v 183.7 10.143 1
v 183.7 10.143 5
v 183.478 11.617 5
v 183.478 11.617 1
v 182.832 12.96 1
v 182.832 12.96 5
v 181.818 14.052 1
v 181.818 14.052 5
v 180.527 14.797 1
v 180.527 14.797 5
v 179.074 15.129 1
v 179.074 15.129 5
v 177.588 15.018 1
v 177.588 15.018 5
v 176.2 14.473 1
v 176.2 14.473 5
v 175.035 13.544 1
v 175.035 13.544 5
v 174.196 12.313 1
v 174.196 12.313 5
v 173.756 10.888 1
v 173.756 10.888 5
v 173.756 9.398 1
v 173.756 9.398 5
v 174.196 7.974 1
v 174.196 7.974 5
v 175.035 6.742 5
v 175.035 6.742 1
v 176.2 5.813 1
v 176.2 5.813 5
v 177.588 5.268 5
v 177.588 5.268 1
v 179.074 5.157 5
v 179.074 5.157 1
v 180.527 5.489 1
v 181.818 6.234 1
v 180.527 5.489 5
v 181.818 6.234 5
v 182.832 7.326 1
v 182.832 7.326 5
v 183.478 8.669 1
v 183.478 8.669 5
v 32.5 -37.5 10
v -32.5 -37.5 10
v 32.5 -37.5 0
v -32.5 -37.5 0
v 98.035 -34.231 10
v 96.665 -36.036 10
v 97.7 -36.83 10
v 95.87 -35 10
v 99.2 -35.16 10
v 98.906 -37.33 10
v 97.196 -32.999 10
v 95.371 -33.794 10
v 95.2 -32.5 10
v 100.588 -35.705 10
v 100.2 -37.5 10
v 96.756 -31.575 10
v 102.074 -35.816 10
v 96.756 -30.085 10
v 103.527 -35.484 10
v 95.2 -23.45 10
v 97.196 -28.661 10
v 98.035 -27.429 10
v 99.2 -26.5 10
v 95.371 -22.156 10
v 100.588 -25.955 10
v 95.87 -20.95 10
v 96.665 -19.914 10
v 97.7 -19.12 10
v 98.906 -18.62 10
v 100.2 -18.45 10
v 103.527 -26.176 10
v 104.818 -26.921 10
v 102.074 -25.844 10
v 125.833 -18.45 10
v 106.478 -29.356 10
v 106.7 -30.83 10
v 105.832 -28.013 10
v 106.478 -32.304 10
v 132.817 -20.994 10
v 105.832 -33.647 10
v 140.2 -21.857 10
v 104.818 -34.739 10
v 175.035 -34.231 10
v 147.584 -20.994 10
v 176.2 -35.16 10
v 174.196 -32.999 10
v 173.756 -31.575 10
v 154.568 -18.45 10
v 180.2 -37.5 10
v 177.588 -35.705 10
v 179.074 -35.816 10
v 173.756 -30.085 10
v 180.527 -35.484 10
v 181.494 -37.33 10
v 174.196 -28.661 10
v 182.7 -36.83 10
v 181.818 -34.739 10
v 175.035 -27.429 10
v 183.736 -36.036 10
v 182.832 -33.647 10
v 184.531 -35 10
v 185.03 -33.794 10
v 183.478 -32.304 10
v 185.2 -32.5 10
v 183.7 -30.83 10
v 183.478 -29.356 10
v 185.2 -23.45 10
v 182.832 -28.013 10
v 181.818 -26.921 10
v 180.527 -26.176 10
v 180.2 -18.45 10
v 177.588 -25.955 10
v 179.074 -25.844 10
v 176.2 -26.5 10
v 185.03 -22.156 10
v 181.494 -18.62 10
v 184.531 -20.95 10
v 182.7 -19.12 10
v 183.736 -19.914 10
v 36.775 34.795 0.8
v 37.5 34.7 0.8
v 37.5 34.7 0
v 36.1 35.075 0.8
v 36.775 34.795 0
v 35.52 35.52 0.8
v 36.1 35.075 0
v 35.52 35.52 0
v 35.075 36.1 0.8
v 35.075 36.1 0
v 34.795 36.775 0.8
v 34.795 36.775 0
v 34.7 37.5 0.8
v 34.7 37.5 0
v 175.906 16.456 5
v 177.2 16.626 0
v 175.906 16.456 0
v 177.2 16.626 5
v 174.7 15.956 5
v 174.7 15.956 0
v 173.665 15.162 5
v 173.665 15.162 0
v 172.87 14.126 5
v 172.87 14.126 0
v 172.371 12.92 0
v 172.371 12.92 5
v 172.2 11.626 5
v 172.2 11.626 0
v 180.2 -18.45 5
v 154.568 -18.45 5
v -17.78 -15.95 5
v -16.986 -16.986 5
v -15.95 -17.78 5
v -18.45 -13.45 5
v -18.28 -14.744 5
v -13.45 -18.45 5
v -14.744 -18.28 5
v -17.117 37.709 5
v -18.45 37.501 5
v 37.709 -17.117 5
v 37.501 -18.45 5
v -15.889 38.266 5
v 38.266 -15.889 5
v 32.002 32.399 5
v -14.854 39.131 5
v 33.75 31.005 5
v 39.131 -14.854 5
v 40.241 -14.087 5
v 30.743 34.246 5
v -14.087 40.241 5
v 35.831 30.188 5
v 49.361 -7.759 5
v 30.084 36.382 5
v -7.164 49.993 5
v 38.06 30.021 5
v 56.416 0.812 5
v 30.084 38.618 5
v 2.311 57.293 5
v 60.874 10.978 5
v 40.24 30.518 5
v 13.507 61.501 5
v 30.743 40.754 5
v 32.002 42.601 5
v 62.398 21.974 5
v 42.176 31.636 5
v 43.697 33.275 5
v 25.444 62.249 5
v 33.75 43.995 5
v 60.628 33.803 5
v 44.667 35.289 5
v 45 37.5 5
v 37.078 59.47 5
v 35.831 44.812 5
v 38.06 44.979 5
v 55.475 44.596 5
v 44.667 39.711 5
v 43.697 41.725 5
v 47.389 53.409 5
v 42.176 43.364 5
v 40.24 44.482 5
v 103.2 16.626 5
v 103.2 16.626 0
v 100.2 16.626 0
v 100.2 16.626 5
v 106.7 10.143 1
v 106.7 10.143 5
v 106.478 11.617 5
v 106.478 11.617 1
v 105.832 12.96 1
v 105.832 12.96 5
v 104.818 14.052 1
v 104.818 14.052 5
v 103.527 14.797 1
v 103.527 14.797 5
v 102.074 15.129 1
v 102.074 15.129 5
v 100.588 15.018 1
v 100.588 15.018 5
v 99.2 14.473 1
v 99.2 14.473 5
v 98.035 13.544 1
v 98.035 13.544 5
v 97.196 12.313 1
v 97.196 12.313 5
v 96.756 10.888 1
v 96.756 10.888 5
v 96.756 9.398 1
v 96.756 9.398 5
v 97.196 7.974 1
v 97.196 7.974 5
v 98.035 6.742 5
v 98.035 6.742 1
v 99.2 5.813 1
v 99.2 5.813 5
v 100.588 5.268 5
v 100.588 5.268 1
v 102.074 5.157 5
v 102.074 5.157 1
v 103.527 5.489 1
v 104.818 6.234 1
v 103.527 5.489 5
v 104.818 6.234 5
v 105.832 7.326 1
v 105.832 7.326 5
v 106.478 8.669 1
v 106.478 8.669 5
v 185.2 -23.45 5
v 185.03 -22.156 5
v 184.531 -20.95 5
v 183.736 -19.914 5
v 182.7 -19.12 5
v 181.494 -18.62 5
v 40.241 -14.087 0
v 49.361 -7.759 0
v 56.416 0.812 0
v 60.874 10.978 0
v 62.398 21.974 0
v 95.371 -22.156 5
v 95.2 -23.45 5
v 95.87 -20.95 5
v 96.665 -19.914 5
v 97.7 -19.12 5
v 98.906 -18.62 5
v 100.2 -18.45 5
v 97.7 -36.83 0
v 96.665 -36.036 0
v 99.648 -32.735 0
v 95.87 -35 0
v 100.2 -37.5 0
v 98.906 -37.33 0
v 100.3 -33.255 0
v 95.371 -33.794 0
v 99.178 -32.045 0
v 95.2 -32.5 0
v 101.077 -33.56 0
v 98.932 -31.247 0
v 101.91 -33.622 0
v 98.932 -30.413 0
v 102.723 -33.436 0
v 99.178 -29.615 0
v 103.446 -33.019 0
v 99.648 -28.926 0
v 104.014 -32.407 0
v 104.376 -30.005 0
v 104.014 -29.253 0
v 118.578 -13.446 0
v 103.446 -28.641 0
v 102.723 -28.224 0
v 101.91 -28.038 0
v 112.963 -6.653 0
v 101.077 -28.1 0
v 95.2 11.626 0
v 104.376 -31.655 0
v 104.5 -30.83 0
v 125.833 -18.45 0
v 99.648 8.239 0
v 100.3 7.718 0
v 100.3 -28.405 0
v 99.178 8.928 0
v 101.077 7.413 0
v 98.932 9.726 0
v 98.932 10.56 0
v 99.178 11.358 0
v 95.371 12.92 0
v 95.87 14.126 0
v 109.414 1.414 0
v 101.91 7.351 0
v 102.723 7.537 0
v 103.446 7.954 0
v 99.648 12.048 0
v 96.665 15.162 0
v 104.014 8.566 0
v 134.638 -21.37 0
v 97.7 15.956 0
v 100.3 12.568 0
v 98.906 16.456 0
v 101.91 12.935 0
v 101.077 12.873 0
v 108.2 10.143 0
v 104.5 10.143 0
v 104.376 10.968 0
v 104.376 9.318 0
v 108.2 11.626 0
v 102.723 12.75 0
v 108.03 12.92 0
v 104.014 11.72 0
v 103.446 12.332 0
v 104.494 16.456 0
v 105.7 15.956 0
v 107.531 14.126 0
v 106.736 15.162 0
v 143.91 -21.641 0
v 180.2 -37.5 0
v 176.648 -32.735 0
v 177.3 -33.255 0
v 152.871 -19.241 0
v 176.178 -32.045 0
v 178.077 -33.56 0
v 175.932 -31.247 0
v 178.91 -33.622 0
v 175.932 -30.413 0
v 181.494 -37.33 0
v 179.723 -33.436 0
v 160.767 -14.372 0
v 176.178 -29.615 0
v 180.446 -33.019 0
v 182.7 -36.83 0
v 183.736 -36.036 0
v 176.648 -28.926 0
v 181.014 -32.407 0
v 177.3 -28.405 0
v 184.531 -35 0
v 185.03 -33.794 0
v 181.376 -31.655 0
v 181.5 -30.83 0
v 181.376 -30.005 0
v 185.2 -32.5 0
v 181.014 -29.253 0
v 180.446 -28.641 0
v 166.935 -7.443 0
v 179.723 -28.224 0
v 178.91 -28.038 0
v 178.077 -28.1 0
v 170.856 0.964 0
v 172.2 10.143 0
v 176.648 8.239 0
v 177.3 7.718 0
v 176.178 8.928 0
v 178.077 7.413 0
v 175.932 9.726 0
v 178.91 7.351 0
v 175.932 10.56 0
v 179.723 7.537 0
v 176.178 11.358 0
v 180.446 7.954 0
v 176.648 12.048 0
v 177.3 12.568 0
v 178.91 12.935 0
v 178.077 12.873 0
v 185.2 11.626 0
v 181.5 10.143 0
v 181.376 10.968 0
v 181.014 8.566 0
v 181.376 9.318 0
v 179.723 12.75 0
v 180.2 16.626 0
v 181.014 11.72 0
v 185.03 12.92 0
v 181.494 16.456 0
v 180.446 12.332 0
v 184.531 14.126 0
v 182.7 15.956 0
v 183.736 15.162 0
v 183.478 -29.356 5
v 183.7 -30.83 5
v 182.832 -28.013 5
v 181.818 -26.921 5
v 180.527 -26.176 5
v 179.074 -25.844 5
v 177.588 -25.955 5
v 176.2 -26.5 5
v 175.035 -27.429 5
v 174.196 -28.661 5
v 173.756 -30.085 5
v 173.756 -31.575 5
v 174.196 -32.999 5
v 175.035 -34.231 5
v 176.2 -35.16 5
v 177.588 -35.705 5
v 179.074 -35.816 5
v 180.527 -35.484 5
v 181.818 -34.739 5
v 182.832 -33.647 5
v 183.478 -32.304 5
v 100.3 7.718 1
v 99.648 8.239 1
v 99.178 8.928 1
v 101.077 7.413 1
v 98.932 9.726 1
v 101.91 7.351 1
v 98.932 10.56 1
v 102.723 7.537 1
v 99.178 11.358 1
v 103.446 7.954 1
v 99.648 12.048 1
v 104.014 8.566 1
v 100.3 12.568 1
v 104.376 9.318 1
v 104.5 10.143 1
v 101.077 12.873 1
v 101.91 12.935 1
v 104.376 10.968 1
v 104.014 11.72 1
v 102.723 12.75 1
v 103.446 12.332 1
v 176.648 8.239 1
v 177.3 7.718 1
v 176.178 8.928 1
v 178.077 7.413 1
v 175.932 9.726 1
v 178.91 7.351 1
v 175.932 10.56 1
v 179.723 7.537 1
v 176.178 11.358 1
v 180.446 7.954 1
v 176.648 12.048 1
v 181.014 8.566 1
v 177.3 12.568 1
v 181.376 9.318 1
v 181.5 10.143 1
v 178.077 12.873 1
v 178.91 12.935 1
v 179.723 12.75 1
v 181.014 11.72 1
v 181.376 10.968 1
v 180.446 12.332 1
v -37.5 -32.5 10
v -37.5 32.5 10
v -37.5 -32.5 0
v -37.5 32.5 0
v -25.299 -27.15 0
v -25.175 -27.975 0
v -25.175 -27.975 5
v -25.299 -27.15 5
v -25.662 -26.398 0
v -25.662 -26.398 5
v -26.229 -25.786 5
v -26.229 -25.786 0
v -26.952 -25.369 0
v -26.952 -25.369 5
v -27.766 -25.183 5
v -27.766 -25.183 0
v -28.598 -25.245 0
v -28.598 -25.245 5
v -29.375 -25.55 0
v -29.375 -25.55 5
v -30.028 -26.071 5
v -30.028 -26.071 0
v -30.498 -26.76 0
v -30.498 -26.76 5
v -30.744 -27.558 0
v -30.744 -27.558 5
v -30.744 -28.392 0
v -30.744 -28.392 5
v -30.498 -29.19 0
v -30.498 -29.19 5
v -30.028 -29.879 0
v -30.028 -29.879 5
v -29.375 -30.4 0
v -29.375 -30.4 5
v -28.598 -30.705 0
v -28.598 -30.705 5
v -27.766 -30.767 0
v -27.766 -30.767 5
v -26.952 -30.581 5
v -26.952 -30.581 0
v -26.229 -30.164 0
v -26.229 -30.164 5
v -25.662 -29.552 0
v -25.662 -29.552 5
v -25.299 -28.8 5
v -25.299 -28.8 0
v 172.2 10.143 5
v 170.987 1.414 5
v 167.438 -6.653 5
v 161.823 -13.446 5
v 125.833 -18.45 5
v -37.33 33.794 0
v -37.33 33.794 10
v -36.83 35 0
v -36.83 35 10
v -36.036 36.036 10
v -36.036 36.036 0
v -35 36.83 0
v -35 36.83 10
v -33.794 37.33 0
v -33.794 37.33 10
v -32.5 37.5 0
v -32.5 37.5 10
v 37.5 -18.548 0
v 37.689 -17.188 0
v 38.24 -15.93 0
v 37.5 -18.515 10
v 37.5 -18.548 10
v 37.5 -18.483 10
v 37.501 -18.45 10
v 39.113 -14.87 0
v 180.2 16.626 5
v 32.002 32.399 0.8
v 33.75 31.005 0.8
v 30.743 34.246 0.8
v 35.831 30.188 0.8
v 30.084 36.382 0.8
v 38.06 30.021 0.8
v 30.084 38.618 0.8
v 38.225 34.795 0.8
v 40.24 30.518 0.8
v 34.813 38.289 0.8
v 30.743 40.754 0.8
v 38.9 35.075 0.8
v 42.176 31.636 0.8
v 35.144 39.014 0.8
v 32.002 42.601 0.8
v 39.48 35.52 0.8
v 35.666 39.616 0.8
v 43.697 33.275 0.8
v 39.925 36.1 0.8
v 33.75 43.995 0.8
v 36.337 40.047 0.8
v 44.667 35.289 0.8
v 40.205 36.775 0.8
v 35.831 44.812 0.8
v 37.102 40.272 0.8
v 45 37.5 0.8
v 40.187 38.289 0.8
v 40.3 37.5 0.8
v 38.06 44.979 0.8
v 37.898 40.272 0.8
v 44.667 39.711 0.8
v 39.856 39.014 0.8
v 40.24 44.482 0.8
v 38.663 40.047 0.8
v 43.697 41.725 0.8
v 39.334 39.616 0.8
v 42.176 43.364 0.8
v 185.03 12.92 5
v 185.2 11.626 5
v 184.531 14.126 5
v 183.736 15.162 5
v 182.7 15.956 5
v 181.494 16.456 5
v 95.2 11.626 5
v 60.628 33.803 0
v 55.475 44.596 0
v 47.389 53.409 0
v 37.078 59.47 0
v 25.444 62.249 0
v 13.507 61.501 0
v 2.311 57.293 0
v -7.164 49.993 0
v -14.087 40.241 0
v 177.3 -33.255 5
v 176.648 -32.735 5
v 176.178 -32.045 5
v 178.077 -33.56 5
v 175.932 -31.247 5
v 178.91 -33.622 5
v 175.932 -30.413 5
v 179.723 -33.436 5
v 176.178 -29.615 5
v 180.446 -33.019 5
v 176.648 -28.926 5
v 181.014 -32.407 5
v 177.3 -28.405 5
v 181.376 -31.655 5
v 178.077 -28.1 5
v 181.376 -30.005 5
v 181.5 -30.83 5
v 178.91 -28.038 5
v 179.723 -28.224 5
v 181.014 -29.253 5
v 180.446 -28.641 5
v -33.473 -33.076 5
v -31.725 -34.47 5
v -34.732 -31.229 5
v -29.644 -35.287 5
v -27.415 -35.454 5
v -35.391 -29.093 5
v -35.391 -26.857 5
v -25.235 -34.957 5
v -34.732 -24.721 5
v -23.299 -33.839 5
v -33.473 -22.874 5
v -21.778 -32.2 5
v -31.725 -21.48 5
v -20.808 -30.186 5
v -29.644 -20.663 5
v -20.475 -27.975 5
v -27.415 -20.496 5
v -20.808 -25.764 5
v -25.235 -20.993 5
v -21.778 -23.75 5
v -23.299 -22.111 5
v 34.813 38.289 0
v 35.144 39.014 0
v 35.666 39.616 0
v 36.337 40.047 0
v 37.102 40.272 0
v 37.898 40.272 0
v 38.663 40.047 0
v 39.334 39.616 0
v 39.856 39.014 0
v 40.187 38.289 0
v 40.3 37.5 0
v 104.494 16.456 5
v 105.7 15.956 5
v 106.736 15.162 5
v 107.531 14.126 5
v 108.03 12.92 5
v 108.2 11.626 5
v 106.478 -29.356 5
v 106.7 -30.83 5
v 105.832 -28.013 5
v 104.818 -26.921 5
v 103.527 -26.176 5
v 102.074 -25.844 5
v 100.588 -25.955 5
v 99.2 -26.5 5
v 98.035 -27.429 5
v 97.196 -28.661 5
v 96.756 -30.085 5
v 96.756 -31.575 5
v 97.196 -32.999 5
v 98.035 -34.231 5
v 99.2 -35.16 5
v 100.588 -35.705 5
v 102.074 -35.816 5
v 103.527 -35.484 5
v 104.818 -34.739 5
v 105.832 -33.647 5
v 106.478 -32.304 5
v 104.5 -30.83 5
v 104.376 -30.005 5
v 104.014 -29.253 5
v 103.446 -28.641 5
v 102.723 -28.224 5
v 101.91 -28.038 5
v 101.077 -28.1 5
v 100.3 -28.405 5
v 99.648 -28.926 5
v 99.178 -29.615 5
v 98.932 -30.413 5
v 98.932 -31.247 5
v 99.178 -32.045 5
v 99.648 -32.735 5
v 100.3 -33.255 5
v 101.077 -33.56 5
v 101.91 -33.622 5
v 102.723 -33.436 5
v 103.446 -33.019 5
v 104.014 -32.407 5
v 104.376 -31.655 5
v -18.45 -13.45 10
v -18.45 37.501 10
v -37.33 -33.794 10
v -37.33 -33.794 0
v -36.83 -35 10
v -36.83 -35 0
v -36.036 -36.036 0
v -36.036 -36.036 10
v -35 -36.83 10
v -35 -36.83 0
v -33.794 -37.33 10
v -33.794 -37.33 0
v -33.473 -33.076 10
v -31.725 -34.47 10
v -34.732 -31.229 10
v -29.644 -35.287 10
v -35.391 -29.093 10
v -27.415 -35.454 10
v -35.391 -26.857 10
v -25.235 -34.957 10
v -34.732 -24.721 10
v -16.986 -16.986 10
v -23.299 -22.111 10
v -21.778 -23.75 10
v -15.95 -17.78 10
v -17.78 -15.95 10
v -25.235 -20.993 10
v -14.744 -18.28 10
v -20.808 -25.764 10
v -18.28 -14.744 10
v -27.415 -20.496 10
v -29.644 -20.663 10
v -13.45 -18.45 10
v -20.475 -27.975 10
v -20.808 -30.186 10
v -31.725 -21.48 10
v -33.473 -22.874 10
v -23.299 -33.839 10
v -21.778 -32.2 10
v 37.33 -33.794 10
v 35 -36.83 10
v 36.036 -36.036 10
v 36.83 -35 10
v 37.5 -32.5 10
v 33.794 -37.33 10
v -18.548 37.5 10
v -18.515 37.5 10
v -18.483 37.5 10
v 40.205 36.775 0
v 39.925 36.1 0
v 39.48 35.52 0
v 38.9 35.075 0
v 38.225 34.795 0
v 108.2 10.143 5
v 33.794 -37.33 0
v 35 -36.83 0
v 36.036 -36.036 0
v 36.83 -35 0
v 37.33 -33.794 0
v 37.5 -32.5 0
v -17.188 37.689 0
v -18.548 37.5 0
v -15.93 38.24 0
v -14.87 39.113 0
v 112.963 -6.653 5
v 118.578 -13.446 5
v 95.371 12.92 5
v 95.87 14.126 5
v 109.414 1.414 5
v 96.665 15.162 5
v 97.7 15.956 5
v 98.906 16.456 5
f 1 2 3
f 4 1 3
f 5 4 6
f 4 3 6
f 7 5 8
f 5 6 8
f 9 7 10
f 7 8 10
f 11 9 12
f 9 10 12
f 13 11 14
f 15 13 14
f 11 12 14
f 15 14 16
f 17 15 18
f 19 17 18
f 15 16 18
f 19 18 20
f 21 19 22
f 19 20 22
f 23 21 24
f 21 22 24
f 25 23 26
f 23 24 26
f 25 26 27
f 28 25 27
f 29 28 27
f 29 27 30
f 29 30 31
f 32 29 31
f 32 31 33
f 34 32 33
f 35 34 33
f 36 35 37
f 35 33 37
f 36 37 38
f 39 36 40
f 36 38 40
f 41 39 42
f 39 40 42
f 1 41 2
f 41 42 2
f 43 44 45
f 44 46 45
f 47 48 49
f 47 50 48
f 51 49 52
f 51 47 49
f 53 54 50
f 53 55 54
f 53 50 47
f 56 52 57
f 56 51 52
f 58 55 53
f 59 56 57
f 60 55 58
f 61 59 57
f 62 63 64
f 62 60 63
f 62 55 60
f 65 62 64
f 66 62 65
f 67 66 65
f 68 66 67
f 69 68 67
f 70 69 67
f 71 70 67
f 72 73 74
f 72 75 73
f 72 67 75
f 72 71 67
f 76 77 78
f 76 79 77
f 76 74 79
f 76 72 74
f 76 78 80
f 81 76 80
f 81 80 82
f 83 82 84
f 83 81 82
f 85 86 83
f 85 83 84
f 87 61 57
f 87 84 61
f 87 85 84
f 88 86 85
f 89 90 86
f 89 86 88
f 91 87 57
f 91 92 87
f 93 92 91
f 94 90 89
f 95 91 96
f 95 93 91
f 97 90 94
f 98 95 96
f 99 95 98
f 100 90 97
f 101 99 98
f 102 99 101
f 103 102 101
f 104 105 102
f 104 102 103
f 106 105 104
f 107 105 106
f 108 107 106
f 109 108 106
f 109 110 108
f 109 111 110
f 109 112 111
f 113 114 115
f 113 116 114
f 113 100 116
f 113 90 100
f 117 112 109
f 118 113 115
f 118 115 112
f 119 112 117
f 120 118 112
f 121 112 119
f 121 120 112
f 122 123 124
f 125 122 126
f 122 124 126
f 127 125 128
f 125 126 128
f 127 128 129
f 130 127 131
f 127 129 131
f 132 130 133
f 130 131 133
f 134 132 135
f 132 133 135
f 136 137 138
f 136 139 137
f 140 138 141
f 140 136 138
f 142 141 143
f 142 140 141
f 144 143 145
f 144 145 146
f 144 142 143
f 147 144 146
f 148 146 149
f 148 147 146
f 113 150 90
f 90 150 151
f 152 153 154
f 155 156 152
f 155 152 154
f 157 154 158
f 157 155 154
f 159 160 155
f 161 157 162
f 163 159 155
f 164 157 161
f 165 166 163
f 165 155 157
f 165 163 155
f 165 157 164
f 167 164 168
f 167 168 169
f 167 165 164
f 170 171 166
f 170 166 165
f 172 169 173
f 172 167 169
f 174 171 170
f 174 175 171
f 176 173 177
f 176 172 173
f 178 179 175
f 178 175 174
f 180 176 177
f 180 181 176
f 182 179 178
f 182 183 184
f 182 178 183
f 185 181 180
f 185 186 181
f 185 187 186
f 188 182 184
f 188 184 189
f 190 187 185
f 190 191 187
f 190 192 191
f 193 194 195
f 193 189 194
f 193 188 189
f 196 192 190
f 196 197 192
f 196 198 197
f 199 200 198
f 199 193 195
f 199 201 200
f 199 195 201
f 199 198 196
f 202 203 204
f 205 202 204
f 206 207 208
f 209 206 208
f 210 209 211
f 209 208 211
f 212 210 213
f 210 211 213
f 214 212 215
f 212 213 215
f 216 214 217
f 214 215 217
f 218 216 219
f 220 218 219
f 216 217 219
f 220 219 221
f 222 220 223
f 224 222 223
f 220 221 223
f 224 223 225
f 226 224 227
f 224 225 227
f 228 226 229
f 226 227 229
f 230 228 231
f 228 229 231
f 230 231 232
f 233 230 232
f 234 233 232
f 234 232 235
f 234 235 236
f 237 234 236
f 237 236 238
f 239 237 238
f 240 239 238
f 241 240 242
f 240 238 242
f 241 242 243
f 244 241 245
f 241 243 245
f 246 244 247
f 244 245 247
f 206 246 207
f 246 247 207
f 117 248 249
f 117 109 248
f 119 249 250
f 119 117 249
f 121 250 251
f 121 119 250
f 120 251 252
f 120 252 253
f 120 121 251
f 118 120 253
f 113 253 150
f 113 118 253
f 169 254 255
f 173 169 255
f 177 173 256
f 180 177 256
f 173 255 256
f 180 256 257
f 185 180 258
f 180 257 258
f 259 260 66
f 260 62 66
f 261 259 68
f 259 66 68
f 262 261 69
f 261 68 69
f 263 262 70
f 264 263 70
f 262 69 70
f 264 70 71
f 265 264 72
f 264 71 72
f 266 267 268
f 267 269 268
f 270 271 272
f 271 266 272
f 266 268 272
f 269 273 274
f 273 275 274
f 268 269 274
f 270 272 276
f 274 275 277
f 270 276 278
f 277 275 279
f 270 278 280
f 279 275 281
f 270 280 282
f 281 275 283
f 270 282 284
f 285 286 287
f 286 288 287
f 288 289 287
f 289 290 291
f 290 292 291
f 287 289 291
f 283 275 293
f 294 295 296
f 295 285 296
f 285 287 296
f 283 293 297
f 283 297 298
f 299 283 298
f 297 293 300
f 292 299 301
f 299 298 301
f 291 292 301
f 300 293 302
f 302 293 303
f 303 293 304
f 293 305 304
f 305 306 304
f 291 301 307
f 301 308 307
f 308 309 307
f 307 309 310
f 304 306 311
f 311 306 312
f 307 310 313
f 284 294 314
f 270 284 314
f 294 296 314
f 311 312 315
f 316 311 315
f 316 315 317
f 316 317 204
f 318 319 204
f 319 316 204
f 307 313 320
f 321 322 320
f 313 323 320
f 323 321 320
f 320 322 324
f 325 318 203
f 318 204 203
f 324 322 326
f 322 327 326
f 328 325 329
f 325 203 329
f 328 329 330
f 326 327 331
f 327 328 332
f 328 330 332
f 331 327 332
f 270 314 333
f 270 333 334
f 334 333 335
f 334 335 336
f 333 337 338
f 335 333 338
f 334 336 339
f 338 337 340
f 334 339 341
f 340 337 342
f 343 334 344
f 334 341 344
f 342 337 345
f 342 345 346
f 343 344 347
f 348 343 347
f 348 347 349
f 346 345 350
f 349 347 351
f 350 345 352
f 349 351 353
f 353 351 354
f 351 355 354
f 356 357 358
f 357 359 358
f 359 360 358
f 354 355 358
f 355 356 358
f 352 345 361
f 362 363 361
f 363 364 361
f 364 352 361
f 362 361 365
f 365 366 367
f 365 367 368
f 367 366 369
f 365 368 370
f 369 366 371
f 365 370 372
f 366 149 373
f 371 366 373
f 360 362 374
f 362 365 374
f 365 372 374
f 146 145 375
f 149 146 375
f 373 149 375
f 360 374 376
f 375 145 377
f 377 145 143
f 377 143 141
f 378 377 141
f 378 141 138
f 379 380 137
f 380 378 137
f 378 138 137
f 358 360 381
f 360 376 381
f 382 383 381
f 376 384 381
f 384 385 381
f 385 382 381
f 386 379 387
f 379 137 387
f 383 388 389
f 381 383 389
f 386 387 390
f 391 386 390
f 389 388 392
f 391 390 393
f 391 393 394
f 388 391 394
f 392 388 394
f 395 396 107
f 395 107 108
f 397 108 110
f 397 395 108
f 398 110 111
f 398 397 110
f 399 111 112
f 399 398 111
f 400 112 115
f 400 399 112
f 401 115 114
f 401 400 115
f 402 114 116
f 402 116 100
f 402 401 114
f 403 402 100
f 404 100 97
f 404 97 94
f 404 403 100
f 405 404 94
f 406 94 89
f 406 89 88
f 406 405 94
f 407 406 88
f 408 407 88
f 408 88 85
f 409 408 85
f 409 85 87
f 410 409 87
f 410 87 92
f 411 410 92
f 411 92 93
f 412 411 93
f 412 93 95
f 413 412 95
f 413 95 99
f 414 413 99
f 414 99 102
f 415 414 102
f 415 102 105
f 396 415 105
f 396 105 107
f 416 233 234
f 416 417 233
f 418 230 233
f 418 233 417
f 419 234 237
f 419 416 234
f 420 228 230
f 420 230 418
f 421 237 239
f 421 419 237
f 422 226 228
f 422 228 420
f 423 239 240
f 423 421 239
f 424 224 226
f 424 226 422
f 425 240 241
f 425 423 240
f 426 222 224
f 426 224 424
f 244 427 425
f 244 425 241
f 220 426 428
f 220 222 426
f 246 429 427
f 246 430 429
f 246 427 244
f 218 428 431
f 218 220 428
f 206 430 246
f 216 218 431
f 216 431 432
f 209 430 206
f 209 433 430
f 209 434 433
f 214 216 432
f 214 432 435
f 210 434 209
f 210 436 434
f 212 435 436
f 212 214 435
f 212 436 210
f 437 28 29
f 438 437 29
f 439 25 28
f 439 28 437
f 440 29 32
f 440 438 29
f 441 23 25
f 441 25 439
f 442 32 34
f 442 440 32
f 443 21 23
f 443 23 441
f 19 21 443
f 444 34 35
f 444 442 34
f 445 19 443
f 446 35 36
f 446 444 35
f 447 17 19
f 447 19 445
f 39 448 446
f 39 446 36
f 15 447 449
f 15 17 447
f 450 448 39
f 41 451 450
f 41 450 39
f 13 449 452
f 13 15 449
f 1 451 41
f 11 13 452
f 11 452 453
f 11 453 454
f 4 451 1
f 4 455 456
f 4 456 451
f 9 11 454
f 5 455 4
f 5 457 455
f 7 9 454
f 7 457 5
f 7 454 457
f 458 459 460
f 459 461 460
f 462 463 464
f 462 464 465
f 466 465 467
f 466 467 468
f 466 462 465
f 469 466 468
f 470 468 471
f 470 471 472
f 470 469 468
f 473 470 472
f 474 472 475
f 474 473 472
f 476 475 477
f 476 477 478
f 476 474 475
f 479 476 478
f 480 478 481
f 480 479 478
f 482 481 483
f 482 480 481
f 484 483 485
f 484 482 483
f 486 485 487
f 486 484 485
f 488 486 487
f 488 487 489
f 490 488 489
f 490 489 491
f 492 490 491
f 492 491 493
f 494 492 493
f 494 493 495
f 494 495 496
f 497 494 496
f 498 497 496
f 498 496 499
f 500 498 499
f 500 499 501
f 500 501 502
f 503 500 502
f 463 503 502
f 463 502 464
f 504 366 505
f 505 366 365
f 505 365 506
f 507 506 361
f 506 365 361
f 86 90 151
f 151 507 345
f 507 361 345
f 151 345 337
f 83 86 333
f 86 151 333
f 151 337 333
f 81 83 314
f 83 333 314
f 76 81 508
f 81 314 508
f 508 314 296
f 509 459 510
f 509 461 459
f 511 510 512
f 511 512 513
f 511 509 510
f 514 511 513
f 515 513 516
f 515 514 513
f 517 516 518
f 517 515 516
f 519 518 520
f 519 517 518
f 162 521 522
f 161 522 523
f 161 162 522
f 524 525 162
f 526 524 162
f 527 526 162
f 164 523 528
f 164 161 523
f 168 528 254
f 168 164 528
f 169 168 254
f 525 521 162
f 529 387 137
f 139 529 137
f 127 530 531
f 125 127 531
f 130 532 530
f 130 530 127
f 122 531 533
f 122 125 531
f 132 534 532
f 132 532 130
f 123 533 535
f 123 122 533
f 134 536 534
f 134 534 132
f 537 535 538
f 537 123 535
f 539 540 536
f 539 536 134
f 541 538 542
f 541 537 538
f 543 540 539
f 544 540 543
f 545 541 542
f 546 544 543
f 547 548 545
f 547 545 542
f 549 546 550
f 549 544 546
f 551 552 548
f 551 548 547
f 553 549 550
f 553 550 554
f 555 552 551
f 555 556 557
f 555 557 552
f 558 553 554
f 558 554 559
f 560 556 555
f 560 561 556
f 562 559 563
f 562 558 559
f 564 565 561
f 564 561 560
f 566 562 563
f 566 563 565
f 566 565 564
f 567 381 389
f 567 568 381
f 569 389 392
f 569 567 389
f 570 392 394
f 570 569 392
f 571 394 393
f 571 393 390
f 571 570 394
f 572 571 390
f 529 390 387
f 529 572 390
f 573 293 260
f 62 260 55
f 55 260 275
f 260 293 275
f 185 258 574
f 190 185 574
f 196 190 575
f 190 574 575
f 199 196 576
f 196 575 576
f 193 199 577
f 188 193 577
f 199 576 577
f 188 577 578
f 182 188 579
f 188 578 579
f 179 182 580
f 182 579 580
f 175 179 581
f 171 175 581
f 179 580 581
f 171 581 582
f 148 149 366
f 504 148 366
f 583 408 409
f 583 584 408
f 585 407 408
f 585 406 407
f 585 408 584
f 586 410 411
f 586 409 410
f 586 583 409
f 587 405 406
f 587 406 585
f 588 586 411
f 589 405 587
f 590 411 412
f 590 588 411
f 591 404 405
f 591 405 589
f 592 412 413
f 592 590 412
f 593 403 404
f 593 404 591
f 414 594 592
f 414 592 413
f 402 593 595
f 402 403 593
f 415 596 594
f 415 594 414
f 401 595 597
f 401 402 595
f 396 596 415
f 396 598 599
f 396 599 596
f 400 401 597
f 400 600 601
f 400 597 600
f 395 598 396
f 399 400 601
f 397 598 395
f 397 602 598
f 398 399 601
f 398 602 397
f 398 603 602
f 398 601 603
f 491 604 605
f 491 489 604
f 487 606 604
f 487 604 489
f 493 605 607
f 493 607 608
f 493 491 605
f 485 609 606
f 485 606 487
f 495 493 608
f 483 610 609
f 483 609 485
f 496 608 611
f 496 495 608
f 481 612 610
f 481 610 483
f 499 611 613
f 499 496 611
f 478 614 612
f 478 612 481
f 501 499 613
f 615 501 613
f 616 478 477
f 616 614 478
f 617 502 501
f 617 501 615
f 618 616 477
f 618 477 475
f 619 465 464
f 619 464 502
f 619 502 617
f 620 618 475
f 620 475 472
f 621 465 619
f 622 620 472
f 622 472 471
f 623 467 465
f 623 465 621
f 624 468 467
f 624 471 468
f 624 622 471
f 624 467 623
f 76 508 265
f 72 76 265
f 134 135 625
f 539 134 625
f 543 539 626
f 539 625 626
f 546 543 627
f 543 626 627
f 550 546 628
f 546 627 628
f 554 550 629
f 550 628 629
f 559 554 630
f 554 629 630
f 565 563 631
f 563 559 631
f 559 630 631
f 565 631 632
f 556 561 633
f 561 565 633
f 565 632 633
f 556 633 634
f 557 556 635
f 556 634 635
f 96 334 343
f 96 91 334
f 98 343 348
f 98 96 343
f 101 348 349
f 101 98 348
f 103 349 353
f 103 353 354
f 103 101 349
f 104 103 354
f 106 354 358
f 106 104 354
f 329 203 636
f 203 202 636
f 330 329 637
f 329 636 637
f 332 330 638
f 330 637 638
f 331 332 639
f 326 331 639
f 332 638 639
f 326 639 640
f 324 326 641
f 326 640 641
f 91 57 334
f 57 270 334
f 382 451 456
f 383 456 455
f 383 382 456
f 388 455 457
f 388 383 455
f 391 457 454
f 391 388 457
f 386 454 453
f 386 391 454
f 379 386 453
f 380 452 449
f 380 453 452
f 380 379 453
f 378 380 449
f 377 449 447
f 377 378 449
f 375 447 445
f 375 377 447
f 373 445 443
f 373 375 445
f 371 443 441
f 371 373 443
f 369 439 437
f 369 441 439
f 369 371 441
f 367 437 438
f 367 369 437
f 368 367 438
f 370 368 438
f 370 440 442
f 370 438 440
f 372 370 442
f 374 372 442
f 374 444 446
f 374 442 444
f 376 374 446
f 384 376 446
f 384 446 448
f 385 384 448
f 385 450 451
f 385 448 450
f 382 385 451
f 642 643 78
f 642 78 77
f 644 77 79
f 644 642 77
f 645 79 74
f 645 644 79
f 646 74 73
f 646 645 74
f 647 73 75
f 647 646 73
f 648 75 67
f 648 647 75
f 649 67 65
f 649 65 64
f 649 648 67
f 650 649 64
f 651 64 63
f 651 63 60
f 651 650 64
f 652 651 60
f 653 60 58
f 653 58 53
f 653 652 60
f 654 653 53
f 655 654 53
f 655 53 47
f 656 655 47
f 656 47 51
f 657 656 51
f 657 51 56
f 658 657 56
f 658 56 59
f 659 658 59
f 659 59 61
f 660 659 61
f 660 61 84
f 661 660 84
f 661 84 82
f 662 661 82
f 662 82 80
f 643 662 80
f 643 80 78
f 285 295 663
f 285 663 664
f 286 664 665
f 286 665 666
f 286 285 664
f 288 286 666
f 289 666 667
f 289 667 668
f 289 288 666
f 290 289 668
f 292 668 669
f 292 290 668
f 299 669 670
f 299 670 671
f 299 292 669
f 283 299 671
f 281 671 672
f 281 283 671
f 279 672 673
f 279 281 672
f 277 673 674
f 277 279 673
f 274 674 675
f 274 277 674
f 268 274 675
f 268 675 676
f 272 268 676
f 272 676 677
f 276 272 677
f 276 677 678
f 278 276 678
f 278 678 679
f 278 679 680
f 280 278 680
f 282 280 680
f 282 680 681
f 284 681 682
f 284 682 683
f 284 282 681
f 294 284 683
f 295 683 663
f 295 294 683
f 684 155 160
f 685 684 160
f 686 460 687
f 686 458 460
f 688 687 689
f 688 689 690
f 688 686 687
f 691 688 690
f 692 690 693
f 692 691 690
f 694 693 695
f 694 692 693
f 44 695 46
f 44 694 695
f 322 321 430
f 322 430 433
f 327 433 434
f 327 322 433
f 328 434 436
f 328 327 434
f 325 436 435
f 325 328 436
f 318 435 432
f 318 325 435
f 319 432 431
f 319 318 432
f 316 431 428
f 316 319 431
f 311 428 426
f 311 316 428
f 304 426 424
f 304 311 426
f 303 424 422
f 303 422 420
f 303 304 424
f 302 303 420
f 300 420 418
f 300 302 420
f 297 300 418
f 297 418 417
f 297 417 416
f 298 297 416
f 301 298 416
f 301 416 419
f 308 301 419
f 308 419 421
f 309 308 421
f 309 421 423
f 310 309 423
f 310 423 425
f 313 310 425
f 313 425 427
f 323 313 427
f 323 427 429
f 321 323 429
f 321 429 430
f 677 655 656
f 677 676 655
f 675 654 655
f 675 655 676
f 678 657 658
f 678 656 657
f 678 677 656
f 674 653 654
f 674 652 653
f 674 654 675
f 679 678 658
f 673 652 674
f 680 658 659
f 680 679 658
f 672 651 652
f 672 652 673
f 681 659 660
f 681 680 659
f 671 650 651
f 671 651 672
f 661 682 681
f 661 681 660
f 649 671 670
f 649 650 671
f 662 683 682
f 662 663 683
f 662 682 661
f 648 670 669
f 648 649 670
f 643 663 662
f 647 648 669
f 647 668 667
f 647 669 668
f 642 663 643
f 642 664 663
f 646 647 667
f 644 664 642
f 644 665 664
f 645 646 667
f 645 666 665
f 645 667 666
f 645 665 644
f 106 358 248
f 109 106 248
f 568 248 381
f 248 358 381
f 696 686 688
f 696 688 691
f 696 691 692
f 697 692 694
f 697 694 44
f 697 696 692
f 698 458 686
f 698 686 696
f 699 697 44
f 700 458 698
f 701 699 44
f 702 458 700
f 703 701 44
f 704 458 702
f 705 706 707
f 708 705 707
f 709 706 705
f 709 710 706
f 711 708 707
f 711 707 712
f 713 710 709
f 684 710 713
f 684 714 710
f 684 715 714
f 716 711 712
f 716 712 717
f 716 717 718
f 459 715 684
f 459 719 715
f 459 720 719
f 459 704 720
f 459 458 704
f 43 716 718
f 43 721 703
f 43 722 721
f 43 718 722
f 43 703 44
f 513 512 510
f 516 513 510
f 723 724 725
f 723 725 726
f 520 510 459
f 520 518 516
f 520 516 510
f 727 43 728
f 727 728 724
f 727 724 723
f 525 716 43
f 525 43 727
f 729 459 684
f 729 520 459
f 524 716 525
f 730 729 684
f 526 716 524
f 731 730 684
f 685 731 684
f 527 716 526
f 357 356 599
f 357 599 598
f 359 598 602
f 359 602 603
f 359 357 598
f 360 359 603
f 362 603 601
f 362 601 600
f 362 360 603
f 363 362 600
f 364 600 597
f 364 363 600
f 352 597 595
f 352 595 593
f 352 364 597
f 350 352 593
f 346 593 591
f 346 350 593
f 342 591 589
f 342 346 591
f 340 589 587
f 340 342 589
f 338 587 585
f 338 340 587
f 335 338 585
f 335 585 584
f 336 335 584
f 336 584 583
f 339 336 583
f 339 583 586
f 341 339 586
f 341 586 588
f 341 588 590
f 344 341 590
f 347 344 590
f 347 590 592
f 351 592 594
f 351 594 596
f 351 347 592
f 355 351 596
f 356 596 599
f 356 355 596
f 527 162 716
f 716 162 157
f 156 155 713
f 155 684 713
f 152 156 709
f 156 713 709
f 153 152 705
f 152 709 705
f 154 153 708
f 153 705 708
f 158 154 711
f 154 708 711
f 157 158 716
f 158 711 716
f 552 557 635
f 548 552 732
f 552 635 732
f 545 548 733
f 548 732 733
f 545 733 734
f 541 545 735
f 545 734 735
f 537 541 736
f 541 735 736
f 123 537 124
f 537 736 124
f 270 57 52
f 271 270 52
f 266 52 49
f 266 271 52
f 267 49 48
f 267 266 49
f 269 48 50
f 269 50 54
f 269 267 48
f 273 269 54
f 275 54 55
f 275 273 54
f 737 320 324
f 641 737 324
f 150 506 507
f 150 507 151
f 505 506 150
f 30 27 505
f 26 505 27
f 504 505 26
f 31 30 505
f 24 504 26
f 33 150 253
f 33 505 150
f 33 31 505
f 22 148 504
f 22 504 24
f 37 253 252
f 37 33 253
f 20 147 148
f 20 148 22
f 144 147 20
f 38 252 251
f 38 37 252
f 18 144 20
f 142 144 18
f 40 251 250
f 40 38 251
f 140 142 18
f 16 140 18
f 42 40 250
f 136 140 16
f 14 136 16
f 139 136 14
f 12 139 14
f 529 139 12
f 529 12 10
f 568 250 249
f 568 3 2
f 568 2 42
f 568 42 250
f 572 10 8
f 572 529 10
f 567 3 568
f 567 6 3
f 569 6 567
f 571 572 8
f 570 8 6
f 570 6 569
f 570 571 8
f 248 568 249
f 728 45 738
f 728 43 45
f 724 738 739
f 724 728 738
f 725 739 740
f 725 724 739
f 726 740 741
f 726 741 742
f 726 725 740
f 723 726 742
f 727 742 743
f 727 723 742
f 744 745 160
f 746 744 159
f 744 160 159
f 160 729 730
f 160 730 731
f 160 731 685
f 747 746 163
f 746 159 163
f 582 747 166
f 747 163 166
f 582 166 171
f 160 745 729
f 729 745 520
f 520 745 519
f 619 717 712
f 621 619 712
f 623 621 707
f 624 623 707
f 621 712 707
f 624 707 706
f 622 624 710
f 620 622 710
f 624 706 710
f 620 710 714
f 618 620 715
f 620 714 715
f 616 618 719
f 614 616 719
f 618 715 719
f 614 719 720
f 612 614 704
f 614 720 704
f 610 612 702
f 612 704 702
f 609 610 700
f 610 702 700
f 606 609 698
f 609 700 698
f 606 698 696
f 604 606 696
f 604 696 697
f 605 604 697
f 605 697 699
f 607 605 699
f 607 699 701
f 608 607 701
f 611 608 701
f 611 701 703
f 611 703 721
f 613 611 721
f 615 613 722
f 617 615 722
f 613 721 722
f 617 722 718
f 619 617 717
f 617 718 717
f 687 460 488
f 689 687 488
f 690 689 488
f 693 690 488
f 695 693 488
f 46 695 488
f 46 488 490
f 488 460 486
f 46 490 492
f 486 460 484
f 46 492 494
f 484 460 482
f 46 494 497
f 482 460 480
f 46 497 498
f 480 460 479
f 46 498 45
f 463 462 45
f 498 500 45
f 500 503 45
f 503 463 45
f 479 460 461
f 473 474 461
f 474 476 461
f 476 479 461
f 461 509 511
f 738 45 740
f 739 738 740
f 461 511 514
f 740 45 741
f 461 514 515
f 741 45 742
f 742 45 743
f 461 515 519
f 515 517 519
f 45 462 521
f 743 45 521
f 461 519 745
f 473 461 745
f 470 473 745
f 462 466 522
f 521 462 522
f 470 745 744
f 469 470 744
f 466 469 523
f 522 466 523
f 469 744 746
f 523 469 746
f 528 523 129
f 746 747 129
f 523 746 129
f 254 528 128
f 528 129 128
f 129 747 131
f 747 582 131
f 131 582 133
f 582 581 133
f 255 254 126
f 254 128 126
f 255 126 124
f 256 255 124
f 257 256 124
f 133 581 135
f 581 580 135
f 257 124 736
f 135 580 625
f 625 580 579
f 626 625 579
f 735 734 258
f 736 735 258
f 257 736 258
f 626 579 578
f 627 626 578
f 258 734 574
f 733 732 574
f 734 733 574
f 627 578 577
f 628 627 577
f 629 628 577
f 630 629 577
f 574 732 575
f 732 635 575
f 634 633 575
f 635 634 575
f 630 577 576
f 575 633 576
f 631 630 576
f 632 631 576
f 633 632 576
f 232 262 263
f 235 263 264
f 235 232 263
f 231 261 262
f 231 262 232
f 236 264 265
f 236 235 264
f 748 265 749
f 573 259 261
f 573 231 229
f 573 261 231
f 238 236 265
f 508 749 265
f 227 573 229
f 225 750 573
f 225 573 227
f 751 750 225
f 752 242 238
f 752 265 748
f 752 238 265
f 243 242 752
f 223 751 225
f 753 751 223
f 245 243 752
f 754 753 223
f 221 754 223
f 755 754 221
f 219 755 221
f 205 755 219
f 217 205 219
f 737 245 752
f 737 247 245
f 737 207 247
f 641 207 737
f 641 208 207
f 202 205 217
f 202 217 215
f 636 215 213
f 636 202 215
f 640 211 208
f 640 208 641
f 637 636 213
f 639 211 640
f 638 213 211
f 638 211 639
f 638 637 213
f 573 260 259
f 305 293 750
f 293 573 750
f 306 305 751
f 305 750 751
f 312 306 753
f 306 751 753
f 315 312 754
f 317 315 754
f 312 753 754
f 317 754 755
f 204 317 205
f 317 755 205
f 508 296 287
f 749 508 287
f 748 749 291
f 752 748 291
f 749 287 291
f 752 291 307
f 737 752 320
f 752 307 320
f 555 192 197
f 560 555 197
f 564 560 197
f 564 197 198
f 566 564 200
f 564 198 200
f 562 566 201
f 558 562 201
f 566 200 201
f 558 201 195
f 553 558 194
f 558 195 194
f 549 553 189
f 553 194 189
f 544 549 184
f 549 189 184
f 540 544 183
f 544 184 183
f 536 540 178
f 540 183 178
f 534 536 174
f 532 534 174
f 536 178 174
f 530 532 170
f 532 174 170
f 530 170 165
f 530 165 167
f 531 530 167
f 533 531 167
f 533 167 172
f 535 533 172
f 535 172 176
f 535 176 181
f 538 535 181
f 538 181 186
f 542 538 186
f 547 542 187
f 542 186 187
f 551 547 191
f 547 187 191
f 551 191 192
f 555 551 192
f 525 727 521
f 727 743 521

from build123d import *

# Parameters (mm, degrees)
F0_W      = 19.05
F0_H      = 19.05
F0_R      = 2.8
F1_DEPTH  = 5
F2_DEPTH  = 10
F4_R      = 7.5
F4_R_2    = 2.8
F5_DEPTH  = 4.2
F3_R      = 7.5
F3_R_2    = 2.8
F6_DEPTH  = 5
F7_R      = 5
F8_R      = 5
F8_W      = 13
F8_H      = 19.05
F8_R_2    = 2.8
F9_DEPTH  = 5
F10_DEPTH = 10
F11_R     = 5
F11_R_2   = 2.8
F12_DEPTH = 4
F13_R     = 5


with BuildPart() as f1:
    # F0 (on Top) → F1 (new body)
    with BuildSketch(Plane.XY):
        Polygon((-37.5, -18.45), (-18.45, -18.45), (-18.45, 21.973952651), (-18.45, 37.5), (-37.5, 37.5), align=None)
        with Locations((-27.975, -27.975)):
            Rectangle(F0_W, F0_H)
        with Locations((-27.975, -27.975)):
            Circle(F0_R, mode=Mode.SUBTRACT)
        Polygon((-18.45, -37.5), (37.5, -37.5), (37.5, -18.45), (21.9739524238, -18.45), (-18.45, -18.45), align=None)
        with BuildLine():
            Line((-18.45, 21.973952651), (-18.45, -18.45))
            Line((-18.45, -18.45), (21.9739524238, -18.45))
            ThreePointArc((21.9739524238, -18.45), (-6.6100984712, -6.6100983105), (-18.45, 21.973952651))
        make_face()
        with BuildLine():
            Line((-18.45, 37.5), (-18.45, 21.973952651))
            ThreePointArc((-18.45, 21.973952651), (-17.6672896125, 29.8902560645), (-15.349468972, 37.5))
            Line((-15.349468972, 37.5), (-18.45, 37.5))
        make_face()
        with BuildLine():
            Line((21.9739524238, -18.45), (37.5, -18.45))
            Line((37.5, -18.45), (37.5, -15.349468972))
            ThreePointArc((37.5, -15.349468972), (29.8902559531, -17.6672896348), (21.9739524238, -18.45))
        make_face()
        with BuildLine():
            ThreePointArc((21.9739524238, -18.45), (29.8902559531, -17.6672896348), (37.5, -15.349468972))
            Line((37.5, -15.349468972), (37.5, 34.7))
            ThreePointArc((37.5, 34.7), (35.5201010127, 35.5201010127), (34.7, 37.5))
            Line((34.7, 37.5), (-15.349468972, 37.5))
            ThreePointArc((-15.349468972, 37.5), (-17.6672896125, 29.8902560645), (-18.45, 21.973952651))
            ThreePointArc((-18.45, 21.973952651), (-6.6100984712, -6.6100983105), (21.9739524238, -18.45))
        make_face()
        with BuildLine():
            Line((37.5, 34.7), (37.5, -15.349468972))
            ThreePointArc((37.5, -15.349468972), (55.6022156959, -0.4589667426), (62.397905302, 21.973952651))
            ThreePointArc((62.397905302, 21.973952651), (29.8902560645, 61.6151949146), (-15.349468972, 37.5))
            Line((-15.349468972, 37.5), (34.7, 37.5))
            ThreePointArc((34.7, 37.5), (37.5, 40.3), (40.3, 37.5))
            ThreePointArc((40.3, 37.5), (39.4798989873, 35.5201010127), (37.5, 34.7))
        make_face()
    extrude(amount=F1_DEPTH)

    # F0 (on Top) → F2 (join)
    with BuildSketch(Plane.XY):
        Polygon((-18.45, -37.5), (37.5, -37.5), (37.5, -18.45), (21.9739524238, -18.45), (-18.45, -18.45), align=None)
        Polygon((-37.5, -18.45), (-18.45, -18.45), (-18.45, 21.973952651), (-18.45, 37.5), (-37.5, 37.5), align=None)
        with Locations((-27.975, -27.975)):
            Rectangle(F0_W, F0_H)
        with Locations((-27.975, -27.975)):
            Circle(F0_R, mode=Mode.SUBTRACT)
    extrude(amount=F2_DEPTH)

    # F4 (on face) → F5 (cut)
    with BuildSketch(Plane.XY.offset(5)):
        with Locations((37.5, 37.5)):
            Circle(F4_R)
        with Locations((37.5, 37.5)):
            Circle(F4_R_2, mode=Mode.SUBTRACT)
    extrude(amount=-F5_DEPTH, mode=Mode.SUBTRACT)

    # F3 (on face) → F6 (cut)
    with BuildSketch(Plane.XY.offset(10)):
        with Locations((-27.975, -27.975)):
            Circle(F3_R)
        with Locations((-27.975, -27.975)):
            Circle(F3_R_2, mode=Mode.SUBTRACT)
    extrude(amount=-F6_DEPTH, mode=Mode.SUBTRACT)

    # F7 (call 1 of 6: OpenCascade refuses the feature's edges together)
    f7_edges = [f1.edges().sort_by_distance(p)[0] for p in [
        (37.5, -15.349469, 2.5),
    ]]
    fillet(f7_edges, radius=F7_R)

    # F7#2 (call 2 of 6)
    f7_2_edges = [f1.edges().sort_by_distance(p)[0] for p in [
        (-15.349469, 37.5, 2.5),
    ]]
    fillet(f7_2_edges, radius=F7_R)

    # F7#3 (call 3 of 6)
    f7_3_edges = [f1.edges().sort_by_distance(p)[0] for p in [
        (-18.45, -18.45, 7.5),
    ]]
    fillet(f7_3_edges, radius=F7_R)

    # F7#4 (call 4 of 6)
    f7_4_edges = [f1.edges().sort_by_distance(p)[0] for p in [
        (-37.5, -37.5, 5),
    ]]
    fillet(f7_4_edges, radius=F7_R)

    # F7#5 (call 5 of 6)
    f7_5_edges = [f1.edges().sort_by_distance(p)[0] for p in [
        (37.5, -37.5, 5),
    ]]
    fillet(f7_5_edges, radius=F7_R)

    # F7#6 (call 6 of 6)
    f7_6_edges = [f1.edges().sort_by_distance(p)[0] for p in [
        (-37.5, 37.5, 5),
    ]]
    fillet(f7_6_edges, radius=F7_R)


with BuildPart() as f9:
    # F8 (on Top) → F9 (new body)
    with BuildSketch(Plane.XY):
        with BuildLine():
            Line((108.2003896236, 10.1430903487), (108.2003896236, -18.45))
            Line((108.2003896236, -18.45), (125.8325371637, -18.45))
            ThreePointArc((125.8325371637, -18.45), (112.9628119164, -6.6531699684), (108.2003896236, 10.1430903487))
        make_face()
        with BuildLine():
            Line((108.2003896236, -18.45), (108.2003896236, -37.5))
            Line((108.2003896236, -37.5), (172.2003896236, -37.5))
            Line((172.2003896236, -37.5), (172.2003896236, -18.45))
            Line((172.2003896236, -18.45), (154.5682420836, -18.45))
            ThreePointArc((154.5682420836, -18.45), (140.2003896236, -21.8569096513), (125.8325371637, -18.45))
            Line((125.8325371637, -18.45), (108.2003896236, -18.45))
        make_face()
        with BuildLine():
            Line((154.5682420836, -18.45), (172.2003896236, -18.45))
            Line((172.2003896236, -18.45), (172.2003896236, 10.1430903487))
            ThreePointArc((172.2003896236, 10.1430903487), (167.4379673309, -6.6531699684), (154.5682420836, -18.45))
        make_face()
        Polygon((95.2003896236, 16.6262220591), (95.2003896236, -18.45), (108.2003896236, -18.45), (108.2003896236, 10.1430903487), (108.2003896236, 16.6262220591), align=None)
        with Locations((101.7003896236, 10.1430903487)):
            Circle(F8_R, mode=Mode.SUBTRACT)
        with Locations((101.7003896236, -27.975)):
            Rectangle(F8_W, F8_H)
        with Locations((101.7003896236, -30.8300182223)):
            Circle(F8_R, mode=Mode.SUBTRACT)
        Polygon((172.2003896236, 10.1430903487), (172.2003896236, -18.45), (185.2003896236, -18.45), (185.2003896236, 16.6262220591), (172.2003896236, 16.6262220591), align=None)
        with Locations((178.7003896236, 10.1430903487)):
            Circle(F8_R, mode=Mode.SUBTRACT)
        with Locations((178.7003896236, -27.975)):
            Rectangle(F8_W, F8_H)
        with Locations((178.7003896236, -30.8300182223)):
            Circle(F8_R, mode=Mode.SUBTRACT)
        with Locations((101.7003896236, -30.8300182223)):
            Circle(F8_R)
        with Locations((101.7003896236, -30.8300182223)):
            Circle(F8_R_2, mode=Mode.SUBTRACT)
        with Locations((101.7003896236, 10.1430903487)):
            Circle(F8_R)
        with Locations((101.7003896236, 10.1430903487)):
            Circle(F8_R_2, mode=Mode.SUBTRACT)
        with Locations((178.7003896236, 10.1430903487)):
            Circle(F8_R)
        with Locations((178.7003896236, 10.1430903487)):
            Circle(F8_R_2, mode=Mode.SUBTRACT)
        with Locations((178.7003896236, -30.8300182223)):
            Circle(F8_R)
        with Locations((178.7003896236, -30.8300182223)):
            Circle(F8_R_2, mode=Mode.SUBTRACT)
    extrude(amount=F9_DEPTH)

    # F8 (on Top) → F10 (join)
    with BuildSketch(Plane.XY):
        with Locations((101.7003896236, -27.975)):
            Rectangle(F8_W, F8_H)
        with Locations((101.7003896236, -30.8300182223)):
            Circle(F8_R, mode=Mode.SUBTRACT)
        with BuildLine():
            Line((108.2003896236, -18.45), (108.2003896236, -37.5))
            Line((108.2003896236, -37.5), (172.2003896236, -37.5))
            Line((172.2003896236, -37.5), (172.2003896236, -18.45))
            Line((172.2003896236, -18.45), (154.5682420836, -18.45))
            ThreePointArc((154.5682420836, -18.45), (140.2003896236, -21.8569096513), (125.8325371637, -18.45))
            Line((125.8325371637, -18.45), (108.2003896236, -18.45))
        make_face()
        with Locations((178.7003896236, -27.975)):
            Rectangle(F8_W, F8_H)
        with Locations((178.7003896236, -30.8300182223)):
            Circle(F8_R, mode=Mode.SUBTRACT)
    extrude(amount=F10_DEPTH)

    # F11 (on face) → F12 (cut)
    with BuildSketch(Plane.XY.offset(5)):
        with Locations((101.7003896236, 10.1430903487)):
            Circle(F11_R)
        with Locations((101.7003896236, 10.1430903487)):
            Circle(F11_R_2, mode=Mode.SUBTRACT)
        with Locations((178.7003896236, 10.1430903487)):
            Circle(F11_R)
    extrude(amount=-F12_DEPTH, mode=Mode.SUBTRACT)

    # F13
    f13_edges = [f9.edges().sort_by_distance(p)[0] for p in [
        (95.20039, 16.626222, 2.5),
        (108.20039, 16.626222, 2.5),
        (172.20039, 16.626222, 2.5),
        (185.20039, 16.626222, 2.5),
        (95.20039, -37.5, 5),
        (185.20039, -37.5, 5),
        (95.20039, -18.45, 7.5),
        (185.20039, -18.45, 7.5),
    ]]
    fillet(f13_edges, radius=F13_R)


solid = Compound([f1.part, f9.part])
